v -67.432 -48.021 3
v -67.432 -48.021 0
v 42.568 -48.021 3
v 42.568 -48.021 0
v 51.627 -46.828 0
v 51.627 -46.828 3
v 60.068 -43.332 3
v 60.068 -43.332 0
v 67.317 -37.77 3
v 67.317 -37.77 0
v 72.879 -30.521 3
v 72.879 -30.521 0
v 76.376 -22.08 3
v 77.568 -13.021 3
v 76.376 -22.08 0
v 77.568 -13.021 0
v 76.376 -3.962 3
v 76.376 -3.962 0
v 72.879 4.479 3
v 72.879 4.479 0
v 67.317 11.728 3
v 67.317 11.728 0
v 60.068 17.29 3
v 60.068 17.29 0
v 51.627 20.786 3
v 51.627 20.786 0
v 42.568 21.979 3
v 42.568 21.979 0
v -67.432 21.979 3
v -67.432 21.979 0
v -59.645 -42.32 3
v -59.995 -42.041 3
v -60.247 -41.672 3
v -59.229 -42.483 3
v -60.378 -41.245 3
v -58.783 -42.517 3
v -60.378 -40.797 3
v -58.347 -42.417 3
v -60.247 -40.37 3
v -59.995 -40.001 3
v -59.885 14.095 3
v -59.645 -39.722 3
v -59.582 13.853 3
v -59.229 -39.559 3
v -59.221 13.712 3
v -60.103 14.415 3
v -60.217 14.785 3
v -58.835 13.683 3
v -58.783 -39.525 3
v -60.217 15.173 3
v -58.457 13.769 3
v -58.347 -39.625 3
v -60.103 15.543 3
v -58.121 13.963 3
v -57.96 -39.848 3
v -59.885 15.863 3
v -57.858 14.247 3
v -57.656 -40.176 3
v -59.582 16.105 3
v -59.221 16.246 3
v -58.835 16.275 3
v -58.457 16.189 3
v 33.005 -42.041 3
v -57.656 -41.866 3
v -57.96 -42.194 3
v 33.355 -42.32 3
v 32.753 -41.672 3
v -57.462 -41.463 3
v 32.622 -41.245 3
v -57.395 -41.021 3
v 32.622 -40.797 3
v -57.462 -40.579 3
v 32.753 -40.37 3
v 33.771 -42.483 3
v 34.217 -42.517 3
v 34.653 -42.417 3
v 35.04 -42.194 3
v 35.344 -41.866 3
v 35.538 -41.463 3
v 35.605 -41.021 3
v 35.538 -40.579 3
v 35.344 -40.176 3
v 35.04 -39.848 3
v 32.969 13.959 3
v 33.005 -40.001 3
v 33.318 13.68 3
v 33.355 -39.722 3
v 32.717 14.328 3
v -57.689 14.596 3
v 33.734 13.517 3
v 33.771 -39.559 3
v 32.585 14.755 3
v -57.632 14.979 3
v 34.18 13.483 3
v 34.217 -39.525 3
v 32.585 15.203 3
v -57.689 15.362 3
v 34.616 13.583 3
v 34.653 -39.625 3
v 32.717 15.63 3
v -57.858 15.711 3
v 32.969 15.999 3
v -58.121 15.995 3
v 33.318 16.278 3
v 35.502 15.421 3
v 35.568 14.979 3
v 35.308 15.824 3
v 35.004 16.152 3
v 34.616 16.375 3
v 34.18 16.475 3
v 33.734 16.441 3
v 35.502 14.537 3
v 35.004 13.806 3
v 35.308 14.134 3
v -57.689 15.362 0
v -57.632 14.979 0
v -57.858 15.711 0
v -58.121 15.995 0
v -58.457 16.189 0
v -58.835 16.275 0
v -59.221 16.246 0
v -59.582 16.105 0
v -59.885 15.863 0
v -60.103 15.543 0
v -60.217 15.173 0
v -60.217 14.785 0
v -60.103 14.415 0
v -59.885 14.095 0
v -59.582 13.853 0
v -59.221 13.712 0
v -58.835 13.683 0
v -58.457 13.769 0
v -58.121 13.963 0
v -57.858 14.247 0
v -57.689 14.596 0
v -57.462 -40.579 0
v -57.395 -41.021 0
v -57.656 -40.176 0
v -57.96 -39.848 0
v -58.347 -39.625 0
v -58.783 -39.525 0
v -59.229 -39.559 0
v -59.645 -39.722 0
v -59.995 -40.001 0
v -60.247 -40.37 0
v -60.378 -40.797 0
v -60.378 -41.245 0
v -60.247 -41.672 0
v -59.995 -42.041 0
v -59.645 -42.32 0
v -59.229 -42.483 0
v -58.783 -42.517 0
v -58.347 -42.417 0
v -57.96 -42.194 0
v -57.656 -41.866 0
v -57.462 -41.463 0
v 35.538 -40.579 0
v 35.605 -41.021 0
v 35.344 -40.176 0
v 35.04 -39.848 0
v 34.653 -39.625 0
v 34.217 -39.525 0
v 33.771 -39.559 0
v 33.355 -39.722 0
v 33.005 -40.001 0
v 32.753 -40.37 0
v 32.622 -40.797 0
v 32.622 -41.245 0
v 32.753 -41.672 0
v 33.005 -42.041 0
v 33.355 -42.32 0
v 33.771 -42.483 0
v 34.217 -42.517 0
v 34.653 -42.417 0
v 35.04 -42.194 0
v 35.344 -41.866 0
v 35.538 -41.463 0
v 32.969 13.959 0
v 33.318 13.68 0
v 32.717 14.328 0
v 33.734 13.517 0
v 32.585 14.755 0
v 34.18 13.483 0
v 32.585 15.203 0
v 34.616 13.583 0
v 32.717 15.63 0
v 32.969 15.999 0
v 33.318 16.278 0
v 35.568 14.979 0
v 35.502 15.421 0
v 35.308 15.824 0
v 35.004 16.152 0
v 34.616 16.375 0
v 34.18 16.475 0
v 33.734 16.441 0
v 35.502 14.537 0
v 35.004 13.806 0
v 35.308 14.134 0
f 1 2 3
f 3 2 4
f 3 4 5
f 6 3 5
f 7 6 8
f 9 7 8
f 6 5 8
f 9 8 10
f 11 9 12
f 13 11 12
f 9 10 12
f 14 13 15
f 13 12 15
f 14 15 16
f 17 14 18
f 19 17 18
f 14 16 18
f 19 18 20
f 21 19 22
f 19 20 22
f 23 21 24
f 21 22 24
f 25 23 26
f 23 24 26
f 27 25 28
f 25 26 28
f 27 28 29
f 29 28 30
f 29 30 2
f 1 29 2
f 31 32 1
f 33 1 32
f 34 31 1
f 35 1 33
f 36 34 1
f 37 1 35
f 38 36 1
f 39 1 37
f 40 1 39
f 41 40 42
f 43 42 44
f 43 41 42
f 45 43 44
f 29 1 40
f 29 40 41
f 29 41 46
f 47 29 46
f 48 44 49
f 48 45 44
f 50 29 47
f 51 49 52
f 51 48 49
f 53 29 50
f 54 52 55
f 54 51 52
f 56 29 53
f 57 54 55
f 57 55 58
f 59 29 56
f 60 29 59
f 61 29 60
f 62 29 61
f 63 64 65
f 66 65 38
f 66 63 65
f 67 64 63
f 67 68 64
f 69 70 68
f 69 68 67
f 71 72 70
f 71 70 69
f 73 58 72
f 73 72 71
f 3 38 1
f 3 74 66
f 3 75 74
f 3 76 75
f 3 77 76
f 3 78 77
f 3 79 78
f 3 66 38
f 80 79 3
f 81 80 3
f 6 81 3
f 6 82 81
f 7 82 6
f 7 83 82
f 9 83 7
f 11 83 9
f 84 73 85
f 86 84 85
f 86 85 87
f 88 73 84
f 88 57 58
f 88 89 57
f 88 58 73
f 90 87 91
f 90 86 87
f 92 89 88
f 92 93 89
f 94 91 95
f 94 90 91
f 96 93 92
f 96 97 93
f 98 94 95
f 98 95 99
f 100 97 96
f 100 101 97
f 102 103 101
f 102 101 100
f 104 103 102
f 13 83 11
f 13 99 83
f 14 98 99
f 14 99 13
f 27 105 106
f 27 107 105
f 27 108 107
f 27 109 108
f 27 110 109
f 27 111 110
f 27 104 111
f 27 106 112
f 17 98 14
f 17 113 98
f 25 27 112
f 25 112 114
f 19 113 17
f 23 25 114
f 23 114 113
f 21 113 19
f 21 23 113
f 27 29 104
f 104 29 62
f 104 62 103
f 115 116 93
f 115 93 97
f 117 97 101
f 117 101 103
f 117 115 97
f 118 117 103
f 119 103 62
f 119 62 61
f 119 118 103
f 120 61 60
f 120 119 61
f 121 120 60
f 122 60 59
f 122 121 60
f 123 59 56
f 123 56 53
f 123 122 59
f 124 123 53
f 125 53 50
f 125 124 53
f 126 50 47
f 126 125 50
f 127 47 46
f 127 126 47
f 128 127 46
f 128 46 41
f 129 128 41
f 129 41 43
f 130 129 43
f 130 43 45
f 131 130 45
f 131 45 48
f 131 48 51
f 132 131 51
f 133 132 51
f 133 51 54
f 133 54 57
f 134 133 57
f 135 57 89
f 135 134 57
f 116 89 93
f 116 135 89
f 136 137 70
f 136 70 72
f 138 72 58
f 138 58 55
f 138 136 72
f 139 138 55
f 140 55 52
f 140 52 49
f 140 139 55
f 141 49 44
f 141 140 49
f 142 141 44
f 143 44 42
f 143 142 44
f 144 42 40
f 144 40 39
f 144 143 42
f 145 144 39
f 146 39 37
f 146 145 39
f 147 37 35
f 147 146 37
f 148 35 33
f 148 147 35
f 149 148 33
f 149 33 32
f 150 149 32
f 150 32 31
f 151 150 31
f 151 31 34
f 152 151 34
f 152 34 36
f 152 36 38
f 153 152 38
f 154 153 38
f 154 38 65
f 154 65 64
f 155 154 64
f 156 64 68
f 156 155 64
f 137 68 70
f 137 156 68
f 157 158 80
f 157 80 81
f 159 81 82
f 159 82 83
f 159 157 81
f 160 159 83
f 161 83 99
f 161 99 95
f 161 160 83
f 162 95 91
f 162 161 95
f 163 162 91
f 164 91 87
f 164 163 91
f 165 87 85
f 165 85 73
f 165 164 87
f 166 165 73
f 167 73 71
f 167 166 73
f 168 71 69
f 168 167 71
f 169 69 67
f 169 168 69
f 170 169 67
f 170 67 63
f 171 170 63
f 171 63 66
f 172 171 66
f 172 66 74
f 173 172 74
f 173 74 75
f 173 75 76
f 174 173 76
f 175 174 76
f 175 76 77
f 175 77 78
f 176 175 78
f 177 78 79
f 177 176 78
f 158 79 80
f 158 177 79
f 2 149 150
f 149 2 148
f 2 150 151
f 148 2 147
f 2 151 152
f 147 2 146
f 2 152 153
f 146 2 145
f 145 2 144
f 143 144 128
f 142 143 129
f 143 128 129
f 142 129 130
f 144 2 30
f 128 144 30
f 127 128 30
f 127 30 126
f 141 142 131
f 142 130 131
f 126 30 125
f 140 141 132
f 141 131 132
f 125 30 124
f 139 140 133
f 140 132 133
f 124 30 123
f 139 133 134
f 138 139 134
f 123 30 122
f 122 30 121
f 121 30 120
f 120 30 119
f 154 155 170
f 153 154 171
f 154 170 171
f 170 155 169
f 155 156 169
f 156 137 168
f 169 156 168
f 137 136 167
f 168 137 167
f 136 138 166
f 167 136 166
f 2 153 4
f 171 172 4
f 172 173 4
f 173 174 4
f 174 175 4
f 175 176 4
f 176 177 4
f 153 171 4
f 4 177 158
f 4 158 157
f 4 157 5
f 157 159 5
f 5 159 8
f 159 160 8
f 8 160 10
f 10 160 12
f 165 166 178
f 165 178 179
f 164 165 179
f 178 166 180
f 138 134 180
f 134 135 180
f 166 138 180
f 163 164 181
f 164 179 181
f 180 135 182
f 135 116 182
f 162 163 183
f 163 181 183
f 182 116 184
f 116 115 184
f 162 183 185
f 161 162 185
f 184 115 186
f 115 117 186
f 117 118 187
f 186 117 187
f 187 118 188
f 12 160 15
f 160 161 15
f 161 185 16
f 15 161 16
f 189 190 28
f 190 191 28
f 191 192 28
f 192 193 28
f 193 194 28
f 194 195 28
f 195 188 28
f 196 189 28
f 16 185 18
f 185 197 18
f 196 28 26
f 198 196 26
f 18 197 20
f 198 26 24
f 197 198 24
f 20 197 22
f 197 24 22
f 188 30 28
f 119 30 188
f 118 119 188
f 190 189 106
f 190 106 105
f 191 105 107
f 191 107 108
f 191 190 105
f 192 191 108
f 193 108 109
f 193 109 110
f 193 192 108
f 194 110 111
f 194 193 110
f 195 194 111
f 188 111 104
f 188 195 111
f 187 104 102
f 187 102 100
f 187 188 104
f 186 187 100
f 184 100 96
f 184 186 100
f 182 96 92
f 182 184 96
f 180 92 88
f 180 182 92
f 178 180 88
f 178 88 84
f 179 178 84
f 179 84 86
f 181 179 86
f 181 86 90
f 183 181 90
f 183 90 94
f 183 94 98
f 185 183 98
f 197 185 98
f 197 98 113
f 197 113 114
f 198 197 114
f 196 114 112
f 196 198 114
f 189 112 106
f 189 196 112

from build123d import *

# Parameters (mm, degrees)
SKETCH1_R           = 1.3
SKETCH1_R_2         = 1.5
BOSS_EXTRUDE1_DEPTH = 3


with BuildPart() as part:
    # Sketch1 → Boss-Extrude1 (new body)
    with BuildSketch(Plane.XY):
        with BuildLine():
            Line((-67.43171984, 21.978952762), (-67.43171984, -48.021047238))
            Line((-67.43171984, -48.021047238), (42.56828016, -48.021047238))
            ThreePointArc((42.56828016, -48.021047238), (77.56828016, -13.021047238), (42.56828016, 21.978952762))
            Line((42.56828016, 21.978952762), (-67.43171984, 21.978952762))
        make_face()
        with Locations((-58.93171984, 14.978952762)):
            Circle(SKETCH1_R, mode=Mode.SUBTRACT)
        with Locations((34.06828016, 14.978952762)):
            Circle(SKETCH1_R_2, mode=Mode.SUBTRACT)
        with Locations((34.104880448, -41.021035277)):
            Circle(SKETCH1_R_2, mode=Mode.SUBTRACT)
        with Locations((-58.895119552, -41.021035277)):
            Circle(SKETCH1_R_2, mode=Mode.SUBTRACT)
    extrude(amount=BOSS_EXTRUDE1_DEPTH)


solid = part.part
